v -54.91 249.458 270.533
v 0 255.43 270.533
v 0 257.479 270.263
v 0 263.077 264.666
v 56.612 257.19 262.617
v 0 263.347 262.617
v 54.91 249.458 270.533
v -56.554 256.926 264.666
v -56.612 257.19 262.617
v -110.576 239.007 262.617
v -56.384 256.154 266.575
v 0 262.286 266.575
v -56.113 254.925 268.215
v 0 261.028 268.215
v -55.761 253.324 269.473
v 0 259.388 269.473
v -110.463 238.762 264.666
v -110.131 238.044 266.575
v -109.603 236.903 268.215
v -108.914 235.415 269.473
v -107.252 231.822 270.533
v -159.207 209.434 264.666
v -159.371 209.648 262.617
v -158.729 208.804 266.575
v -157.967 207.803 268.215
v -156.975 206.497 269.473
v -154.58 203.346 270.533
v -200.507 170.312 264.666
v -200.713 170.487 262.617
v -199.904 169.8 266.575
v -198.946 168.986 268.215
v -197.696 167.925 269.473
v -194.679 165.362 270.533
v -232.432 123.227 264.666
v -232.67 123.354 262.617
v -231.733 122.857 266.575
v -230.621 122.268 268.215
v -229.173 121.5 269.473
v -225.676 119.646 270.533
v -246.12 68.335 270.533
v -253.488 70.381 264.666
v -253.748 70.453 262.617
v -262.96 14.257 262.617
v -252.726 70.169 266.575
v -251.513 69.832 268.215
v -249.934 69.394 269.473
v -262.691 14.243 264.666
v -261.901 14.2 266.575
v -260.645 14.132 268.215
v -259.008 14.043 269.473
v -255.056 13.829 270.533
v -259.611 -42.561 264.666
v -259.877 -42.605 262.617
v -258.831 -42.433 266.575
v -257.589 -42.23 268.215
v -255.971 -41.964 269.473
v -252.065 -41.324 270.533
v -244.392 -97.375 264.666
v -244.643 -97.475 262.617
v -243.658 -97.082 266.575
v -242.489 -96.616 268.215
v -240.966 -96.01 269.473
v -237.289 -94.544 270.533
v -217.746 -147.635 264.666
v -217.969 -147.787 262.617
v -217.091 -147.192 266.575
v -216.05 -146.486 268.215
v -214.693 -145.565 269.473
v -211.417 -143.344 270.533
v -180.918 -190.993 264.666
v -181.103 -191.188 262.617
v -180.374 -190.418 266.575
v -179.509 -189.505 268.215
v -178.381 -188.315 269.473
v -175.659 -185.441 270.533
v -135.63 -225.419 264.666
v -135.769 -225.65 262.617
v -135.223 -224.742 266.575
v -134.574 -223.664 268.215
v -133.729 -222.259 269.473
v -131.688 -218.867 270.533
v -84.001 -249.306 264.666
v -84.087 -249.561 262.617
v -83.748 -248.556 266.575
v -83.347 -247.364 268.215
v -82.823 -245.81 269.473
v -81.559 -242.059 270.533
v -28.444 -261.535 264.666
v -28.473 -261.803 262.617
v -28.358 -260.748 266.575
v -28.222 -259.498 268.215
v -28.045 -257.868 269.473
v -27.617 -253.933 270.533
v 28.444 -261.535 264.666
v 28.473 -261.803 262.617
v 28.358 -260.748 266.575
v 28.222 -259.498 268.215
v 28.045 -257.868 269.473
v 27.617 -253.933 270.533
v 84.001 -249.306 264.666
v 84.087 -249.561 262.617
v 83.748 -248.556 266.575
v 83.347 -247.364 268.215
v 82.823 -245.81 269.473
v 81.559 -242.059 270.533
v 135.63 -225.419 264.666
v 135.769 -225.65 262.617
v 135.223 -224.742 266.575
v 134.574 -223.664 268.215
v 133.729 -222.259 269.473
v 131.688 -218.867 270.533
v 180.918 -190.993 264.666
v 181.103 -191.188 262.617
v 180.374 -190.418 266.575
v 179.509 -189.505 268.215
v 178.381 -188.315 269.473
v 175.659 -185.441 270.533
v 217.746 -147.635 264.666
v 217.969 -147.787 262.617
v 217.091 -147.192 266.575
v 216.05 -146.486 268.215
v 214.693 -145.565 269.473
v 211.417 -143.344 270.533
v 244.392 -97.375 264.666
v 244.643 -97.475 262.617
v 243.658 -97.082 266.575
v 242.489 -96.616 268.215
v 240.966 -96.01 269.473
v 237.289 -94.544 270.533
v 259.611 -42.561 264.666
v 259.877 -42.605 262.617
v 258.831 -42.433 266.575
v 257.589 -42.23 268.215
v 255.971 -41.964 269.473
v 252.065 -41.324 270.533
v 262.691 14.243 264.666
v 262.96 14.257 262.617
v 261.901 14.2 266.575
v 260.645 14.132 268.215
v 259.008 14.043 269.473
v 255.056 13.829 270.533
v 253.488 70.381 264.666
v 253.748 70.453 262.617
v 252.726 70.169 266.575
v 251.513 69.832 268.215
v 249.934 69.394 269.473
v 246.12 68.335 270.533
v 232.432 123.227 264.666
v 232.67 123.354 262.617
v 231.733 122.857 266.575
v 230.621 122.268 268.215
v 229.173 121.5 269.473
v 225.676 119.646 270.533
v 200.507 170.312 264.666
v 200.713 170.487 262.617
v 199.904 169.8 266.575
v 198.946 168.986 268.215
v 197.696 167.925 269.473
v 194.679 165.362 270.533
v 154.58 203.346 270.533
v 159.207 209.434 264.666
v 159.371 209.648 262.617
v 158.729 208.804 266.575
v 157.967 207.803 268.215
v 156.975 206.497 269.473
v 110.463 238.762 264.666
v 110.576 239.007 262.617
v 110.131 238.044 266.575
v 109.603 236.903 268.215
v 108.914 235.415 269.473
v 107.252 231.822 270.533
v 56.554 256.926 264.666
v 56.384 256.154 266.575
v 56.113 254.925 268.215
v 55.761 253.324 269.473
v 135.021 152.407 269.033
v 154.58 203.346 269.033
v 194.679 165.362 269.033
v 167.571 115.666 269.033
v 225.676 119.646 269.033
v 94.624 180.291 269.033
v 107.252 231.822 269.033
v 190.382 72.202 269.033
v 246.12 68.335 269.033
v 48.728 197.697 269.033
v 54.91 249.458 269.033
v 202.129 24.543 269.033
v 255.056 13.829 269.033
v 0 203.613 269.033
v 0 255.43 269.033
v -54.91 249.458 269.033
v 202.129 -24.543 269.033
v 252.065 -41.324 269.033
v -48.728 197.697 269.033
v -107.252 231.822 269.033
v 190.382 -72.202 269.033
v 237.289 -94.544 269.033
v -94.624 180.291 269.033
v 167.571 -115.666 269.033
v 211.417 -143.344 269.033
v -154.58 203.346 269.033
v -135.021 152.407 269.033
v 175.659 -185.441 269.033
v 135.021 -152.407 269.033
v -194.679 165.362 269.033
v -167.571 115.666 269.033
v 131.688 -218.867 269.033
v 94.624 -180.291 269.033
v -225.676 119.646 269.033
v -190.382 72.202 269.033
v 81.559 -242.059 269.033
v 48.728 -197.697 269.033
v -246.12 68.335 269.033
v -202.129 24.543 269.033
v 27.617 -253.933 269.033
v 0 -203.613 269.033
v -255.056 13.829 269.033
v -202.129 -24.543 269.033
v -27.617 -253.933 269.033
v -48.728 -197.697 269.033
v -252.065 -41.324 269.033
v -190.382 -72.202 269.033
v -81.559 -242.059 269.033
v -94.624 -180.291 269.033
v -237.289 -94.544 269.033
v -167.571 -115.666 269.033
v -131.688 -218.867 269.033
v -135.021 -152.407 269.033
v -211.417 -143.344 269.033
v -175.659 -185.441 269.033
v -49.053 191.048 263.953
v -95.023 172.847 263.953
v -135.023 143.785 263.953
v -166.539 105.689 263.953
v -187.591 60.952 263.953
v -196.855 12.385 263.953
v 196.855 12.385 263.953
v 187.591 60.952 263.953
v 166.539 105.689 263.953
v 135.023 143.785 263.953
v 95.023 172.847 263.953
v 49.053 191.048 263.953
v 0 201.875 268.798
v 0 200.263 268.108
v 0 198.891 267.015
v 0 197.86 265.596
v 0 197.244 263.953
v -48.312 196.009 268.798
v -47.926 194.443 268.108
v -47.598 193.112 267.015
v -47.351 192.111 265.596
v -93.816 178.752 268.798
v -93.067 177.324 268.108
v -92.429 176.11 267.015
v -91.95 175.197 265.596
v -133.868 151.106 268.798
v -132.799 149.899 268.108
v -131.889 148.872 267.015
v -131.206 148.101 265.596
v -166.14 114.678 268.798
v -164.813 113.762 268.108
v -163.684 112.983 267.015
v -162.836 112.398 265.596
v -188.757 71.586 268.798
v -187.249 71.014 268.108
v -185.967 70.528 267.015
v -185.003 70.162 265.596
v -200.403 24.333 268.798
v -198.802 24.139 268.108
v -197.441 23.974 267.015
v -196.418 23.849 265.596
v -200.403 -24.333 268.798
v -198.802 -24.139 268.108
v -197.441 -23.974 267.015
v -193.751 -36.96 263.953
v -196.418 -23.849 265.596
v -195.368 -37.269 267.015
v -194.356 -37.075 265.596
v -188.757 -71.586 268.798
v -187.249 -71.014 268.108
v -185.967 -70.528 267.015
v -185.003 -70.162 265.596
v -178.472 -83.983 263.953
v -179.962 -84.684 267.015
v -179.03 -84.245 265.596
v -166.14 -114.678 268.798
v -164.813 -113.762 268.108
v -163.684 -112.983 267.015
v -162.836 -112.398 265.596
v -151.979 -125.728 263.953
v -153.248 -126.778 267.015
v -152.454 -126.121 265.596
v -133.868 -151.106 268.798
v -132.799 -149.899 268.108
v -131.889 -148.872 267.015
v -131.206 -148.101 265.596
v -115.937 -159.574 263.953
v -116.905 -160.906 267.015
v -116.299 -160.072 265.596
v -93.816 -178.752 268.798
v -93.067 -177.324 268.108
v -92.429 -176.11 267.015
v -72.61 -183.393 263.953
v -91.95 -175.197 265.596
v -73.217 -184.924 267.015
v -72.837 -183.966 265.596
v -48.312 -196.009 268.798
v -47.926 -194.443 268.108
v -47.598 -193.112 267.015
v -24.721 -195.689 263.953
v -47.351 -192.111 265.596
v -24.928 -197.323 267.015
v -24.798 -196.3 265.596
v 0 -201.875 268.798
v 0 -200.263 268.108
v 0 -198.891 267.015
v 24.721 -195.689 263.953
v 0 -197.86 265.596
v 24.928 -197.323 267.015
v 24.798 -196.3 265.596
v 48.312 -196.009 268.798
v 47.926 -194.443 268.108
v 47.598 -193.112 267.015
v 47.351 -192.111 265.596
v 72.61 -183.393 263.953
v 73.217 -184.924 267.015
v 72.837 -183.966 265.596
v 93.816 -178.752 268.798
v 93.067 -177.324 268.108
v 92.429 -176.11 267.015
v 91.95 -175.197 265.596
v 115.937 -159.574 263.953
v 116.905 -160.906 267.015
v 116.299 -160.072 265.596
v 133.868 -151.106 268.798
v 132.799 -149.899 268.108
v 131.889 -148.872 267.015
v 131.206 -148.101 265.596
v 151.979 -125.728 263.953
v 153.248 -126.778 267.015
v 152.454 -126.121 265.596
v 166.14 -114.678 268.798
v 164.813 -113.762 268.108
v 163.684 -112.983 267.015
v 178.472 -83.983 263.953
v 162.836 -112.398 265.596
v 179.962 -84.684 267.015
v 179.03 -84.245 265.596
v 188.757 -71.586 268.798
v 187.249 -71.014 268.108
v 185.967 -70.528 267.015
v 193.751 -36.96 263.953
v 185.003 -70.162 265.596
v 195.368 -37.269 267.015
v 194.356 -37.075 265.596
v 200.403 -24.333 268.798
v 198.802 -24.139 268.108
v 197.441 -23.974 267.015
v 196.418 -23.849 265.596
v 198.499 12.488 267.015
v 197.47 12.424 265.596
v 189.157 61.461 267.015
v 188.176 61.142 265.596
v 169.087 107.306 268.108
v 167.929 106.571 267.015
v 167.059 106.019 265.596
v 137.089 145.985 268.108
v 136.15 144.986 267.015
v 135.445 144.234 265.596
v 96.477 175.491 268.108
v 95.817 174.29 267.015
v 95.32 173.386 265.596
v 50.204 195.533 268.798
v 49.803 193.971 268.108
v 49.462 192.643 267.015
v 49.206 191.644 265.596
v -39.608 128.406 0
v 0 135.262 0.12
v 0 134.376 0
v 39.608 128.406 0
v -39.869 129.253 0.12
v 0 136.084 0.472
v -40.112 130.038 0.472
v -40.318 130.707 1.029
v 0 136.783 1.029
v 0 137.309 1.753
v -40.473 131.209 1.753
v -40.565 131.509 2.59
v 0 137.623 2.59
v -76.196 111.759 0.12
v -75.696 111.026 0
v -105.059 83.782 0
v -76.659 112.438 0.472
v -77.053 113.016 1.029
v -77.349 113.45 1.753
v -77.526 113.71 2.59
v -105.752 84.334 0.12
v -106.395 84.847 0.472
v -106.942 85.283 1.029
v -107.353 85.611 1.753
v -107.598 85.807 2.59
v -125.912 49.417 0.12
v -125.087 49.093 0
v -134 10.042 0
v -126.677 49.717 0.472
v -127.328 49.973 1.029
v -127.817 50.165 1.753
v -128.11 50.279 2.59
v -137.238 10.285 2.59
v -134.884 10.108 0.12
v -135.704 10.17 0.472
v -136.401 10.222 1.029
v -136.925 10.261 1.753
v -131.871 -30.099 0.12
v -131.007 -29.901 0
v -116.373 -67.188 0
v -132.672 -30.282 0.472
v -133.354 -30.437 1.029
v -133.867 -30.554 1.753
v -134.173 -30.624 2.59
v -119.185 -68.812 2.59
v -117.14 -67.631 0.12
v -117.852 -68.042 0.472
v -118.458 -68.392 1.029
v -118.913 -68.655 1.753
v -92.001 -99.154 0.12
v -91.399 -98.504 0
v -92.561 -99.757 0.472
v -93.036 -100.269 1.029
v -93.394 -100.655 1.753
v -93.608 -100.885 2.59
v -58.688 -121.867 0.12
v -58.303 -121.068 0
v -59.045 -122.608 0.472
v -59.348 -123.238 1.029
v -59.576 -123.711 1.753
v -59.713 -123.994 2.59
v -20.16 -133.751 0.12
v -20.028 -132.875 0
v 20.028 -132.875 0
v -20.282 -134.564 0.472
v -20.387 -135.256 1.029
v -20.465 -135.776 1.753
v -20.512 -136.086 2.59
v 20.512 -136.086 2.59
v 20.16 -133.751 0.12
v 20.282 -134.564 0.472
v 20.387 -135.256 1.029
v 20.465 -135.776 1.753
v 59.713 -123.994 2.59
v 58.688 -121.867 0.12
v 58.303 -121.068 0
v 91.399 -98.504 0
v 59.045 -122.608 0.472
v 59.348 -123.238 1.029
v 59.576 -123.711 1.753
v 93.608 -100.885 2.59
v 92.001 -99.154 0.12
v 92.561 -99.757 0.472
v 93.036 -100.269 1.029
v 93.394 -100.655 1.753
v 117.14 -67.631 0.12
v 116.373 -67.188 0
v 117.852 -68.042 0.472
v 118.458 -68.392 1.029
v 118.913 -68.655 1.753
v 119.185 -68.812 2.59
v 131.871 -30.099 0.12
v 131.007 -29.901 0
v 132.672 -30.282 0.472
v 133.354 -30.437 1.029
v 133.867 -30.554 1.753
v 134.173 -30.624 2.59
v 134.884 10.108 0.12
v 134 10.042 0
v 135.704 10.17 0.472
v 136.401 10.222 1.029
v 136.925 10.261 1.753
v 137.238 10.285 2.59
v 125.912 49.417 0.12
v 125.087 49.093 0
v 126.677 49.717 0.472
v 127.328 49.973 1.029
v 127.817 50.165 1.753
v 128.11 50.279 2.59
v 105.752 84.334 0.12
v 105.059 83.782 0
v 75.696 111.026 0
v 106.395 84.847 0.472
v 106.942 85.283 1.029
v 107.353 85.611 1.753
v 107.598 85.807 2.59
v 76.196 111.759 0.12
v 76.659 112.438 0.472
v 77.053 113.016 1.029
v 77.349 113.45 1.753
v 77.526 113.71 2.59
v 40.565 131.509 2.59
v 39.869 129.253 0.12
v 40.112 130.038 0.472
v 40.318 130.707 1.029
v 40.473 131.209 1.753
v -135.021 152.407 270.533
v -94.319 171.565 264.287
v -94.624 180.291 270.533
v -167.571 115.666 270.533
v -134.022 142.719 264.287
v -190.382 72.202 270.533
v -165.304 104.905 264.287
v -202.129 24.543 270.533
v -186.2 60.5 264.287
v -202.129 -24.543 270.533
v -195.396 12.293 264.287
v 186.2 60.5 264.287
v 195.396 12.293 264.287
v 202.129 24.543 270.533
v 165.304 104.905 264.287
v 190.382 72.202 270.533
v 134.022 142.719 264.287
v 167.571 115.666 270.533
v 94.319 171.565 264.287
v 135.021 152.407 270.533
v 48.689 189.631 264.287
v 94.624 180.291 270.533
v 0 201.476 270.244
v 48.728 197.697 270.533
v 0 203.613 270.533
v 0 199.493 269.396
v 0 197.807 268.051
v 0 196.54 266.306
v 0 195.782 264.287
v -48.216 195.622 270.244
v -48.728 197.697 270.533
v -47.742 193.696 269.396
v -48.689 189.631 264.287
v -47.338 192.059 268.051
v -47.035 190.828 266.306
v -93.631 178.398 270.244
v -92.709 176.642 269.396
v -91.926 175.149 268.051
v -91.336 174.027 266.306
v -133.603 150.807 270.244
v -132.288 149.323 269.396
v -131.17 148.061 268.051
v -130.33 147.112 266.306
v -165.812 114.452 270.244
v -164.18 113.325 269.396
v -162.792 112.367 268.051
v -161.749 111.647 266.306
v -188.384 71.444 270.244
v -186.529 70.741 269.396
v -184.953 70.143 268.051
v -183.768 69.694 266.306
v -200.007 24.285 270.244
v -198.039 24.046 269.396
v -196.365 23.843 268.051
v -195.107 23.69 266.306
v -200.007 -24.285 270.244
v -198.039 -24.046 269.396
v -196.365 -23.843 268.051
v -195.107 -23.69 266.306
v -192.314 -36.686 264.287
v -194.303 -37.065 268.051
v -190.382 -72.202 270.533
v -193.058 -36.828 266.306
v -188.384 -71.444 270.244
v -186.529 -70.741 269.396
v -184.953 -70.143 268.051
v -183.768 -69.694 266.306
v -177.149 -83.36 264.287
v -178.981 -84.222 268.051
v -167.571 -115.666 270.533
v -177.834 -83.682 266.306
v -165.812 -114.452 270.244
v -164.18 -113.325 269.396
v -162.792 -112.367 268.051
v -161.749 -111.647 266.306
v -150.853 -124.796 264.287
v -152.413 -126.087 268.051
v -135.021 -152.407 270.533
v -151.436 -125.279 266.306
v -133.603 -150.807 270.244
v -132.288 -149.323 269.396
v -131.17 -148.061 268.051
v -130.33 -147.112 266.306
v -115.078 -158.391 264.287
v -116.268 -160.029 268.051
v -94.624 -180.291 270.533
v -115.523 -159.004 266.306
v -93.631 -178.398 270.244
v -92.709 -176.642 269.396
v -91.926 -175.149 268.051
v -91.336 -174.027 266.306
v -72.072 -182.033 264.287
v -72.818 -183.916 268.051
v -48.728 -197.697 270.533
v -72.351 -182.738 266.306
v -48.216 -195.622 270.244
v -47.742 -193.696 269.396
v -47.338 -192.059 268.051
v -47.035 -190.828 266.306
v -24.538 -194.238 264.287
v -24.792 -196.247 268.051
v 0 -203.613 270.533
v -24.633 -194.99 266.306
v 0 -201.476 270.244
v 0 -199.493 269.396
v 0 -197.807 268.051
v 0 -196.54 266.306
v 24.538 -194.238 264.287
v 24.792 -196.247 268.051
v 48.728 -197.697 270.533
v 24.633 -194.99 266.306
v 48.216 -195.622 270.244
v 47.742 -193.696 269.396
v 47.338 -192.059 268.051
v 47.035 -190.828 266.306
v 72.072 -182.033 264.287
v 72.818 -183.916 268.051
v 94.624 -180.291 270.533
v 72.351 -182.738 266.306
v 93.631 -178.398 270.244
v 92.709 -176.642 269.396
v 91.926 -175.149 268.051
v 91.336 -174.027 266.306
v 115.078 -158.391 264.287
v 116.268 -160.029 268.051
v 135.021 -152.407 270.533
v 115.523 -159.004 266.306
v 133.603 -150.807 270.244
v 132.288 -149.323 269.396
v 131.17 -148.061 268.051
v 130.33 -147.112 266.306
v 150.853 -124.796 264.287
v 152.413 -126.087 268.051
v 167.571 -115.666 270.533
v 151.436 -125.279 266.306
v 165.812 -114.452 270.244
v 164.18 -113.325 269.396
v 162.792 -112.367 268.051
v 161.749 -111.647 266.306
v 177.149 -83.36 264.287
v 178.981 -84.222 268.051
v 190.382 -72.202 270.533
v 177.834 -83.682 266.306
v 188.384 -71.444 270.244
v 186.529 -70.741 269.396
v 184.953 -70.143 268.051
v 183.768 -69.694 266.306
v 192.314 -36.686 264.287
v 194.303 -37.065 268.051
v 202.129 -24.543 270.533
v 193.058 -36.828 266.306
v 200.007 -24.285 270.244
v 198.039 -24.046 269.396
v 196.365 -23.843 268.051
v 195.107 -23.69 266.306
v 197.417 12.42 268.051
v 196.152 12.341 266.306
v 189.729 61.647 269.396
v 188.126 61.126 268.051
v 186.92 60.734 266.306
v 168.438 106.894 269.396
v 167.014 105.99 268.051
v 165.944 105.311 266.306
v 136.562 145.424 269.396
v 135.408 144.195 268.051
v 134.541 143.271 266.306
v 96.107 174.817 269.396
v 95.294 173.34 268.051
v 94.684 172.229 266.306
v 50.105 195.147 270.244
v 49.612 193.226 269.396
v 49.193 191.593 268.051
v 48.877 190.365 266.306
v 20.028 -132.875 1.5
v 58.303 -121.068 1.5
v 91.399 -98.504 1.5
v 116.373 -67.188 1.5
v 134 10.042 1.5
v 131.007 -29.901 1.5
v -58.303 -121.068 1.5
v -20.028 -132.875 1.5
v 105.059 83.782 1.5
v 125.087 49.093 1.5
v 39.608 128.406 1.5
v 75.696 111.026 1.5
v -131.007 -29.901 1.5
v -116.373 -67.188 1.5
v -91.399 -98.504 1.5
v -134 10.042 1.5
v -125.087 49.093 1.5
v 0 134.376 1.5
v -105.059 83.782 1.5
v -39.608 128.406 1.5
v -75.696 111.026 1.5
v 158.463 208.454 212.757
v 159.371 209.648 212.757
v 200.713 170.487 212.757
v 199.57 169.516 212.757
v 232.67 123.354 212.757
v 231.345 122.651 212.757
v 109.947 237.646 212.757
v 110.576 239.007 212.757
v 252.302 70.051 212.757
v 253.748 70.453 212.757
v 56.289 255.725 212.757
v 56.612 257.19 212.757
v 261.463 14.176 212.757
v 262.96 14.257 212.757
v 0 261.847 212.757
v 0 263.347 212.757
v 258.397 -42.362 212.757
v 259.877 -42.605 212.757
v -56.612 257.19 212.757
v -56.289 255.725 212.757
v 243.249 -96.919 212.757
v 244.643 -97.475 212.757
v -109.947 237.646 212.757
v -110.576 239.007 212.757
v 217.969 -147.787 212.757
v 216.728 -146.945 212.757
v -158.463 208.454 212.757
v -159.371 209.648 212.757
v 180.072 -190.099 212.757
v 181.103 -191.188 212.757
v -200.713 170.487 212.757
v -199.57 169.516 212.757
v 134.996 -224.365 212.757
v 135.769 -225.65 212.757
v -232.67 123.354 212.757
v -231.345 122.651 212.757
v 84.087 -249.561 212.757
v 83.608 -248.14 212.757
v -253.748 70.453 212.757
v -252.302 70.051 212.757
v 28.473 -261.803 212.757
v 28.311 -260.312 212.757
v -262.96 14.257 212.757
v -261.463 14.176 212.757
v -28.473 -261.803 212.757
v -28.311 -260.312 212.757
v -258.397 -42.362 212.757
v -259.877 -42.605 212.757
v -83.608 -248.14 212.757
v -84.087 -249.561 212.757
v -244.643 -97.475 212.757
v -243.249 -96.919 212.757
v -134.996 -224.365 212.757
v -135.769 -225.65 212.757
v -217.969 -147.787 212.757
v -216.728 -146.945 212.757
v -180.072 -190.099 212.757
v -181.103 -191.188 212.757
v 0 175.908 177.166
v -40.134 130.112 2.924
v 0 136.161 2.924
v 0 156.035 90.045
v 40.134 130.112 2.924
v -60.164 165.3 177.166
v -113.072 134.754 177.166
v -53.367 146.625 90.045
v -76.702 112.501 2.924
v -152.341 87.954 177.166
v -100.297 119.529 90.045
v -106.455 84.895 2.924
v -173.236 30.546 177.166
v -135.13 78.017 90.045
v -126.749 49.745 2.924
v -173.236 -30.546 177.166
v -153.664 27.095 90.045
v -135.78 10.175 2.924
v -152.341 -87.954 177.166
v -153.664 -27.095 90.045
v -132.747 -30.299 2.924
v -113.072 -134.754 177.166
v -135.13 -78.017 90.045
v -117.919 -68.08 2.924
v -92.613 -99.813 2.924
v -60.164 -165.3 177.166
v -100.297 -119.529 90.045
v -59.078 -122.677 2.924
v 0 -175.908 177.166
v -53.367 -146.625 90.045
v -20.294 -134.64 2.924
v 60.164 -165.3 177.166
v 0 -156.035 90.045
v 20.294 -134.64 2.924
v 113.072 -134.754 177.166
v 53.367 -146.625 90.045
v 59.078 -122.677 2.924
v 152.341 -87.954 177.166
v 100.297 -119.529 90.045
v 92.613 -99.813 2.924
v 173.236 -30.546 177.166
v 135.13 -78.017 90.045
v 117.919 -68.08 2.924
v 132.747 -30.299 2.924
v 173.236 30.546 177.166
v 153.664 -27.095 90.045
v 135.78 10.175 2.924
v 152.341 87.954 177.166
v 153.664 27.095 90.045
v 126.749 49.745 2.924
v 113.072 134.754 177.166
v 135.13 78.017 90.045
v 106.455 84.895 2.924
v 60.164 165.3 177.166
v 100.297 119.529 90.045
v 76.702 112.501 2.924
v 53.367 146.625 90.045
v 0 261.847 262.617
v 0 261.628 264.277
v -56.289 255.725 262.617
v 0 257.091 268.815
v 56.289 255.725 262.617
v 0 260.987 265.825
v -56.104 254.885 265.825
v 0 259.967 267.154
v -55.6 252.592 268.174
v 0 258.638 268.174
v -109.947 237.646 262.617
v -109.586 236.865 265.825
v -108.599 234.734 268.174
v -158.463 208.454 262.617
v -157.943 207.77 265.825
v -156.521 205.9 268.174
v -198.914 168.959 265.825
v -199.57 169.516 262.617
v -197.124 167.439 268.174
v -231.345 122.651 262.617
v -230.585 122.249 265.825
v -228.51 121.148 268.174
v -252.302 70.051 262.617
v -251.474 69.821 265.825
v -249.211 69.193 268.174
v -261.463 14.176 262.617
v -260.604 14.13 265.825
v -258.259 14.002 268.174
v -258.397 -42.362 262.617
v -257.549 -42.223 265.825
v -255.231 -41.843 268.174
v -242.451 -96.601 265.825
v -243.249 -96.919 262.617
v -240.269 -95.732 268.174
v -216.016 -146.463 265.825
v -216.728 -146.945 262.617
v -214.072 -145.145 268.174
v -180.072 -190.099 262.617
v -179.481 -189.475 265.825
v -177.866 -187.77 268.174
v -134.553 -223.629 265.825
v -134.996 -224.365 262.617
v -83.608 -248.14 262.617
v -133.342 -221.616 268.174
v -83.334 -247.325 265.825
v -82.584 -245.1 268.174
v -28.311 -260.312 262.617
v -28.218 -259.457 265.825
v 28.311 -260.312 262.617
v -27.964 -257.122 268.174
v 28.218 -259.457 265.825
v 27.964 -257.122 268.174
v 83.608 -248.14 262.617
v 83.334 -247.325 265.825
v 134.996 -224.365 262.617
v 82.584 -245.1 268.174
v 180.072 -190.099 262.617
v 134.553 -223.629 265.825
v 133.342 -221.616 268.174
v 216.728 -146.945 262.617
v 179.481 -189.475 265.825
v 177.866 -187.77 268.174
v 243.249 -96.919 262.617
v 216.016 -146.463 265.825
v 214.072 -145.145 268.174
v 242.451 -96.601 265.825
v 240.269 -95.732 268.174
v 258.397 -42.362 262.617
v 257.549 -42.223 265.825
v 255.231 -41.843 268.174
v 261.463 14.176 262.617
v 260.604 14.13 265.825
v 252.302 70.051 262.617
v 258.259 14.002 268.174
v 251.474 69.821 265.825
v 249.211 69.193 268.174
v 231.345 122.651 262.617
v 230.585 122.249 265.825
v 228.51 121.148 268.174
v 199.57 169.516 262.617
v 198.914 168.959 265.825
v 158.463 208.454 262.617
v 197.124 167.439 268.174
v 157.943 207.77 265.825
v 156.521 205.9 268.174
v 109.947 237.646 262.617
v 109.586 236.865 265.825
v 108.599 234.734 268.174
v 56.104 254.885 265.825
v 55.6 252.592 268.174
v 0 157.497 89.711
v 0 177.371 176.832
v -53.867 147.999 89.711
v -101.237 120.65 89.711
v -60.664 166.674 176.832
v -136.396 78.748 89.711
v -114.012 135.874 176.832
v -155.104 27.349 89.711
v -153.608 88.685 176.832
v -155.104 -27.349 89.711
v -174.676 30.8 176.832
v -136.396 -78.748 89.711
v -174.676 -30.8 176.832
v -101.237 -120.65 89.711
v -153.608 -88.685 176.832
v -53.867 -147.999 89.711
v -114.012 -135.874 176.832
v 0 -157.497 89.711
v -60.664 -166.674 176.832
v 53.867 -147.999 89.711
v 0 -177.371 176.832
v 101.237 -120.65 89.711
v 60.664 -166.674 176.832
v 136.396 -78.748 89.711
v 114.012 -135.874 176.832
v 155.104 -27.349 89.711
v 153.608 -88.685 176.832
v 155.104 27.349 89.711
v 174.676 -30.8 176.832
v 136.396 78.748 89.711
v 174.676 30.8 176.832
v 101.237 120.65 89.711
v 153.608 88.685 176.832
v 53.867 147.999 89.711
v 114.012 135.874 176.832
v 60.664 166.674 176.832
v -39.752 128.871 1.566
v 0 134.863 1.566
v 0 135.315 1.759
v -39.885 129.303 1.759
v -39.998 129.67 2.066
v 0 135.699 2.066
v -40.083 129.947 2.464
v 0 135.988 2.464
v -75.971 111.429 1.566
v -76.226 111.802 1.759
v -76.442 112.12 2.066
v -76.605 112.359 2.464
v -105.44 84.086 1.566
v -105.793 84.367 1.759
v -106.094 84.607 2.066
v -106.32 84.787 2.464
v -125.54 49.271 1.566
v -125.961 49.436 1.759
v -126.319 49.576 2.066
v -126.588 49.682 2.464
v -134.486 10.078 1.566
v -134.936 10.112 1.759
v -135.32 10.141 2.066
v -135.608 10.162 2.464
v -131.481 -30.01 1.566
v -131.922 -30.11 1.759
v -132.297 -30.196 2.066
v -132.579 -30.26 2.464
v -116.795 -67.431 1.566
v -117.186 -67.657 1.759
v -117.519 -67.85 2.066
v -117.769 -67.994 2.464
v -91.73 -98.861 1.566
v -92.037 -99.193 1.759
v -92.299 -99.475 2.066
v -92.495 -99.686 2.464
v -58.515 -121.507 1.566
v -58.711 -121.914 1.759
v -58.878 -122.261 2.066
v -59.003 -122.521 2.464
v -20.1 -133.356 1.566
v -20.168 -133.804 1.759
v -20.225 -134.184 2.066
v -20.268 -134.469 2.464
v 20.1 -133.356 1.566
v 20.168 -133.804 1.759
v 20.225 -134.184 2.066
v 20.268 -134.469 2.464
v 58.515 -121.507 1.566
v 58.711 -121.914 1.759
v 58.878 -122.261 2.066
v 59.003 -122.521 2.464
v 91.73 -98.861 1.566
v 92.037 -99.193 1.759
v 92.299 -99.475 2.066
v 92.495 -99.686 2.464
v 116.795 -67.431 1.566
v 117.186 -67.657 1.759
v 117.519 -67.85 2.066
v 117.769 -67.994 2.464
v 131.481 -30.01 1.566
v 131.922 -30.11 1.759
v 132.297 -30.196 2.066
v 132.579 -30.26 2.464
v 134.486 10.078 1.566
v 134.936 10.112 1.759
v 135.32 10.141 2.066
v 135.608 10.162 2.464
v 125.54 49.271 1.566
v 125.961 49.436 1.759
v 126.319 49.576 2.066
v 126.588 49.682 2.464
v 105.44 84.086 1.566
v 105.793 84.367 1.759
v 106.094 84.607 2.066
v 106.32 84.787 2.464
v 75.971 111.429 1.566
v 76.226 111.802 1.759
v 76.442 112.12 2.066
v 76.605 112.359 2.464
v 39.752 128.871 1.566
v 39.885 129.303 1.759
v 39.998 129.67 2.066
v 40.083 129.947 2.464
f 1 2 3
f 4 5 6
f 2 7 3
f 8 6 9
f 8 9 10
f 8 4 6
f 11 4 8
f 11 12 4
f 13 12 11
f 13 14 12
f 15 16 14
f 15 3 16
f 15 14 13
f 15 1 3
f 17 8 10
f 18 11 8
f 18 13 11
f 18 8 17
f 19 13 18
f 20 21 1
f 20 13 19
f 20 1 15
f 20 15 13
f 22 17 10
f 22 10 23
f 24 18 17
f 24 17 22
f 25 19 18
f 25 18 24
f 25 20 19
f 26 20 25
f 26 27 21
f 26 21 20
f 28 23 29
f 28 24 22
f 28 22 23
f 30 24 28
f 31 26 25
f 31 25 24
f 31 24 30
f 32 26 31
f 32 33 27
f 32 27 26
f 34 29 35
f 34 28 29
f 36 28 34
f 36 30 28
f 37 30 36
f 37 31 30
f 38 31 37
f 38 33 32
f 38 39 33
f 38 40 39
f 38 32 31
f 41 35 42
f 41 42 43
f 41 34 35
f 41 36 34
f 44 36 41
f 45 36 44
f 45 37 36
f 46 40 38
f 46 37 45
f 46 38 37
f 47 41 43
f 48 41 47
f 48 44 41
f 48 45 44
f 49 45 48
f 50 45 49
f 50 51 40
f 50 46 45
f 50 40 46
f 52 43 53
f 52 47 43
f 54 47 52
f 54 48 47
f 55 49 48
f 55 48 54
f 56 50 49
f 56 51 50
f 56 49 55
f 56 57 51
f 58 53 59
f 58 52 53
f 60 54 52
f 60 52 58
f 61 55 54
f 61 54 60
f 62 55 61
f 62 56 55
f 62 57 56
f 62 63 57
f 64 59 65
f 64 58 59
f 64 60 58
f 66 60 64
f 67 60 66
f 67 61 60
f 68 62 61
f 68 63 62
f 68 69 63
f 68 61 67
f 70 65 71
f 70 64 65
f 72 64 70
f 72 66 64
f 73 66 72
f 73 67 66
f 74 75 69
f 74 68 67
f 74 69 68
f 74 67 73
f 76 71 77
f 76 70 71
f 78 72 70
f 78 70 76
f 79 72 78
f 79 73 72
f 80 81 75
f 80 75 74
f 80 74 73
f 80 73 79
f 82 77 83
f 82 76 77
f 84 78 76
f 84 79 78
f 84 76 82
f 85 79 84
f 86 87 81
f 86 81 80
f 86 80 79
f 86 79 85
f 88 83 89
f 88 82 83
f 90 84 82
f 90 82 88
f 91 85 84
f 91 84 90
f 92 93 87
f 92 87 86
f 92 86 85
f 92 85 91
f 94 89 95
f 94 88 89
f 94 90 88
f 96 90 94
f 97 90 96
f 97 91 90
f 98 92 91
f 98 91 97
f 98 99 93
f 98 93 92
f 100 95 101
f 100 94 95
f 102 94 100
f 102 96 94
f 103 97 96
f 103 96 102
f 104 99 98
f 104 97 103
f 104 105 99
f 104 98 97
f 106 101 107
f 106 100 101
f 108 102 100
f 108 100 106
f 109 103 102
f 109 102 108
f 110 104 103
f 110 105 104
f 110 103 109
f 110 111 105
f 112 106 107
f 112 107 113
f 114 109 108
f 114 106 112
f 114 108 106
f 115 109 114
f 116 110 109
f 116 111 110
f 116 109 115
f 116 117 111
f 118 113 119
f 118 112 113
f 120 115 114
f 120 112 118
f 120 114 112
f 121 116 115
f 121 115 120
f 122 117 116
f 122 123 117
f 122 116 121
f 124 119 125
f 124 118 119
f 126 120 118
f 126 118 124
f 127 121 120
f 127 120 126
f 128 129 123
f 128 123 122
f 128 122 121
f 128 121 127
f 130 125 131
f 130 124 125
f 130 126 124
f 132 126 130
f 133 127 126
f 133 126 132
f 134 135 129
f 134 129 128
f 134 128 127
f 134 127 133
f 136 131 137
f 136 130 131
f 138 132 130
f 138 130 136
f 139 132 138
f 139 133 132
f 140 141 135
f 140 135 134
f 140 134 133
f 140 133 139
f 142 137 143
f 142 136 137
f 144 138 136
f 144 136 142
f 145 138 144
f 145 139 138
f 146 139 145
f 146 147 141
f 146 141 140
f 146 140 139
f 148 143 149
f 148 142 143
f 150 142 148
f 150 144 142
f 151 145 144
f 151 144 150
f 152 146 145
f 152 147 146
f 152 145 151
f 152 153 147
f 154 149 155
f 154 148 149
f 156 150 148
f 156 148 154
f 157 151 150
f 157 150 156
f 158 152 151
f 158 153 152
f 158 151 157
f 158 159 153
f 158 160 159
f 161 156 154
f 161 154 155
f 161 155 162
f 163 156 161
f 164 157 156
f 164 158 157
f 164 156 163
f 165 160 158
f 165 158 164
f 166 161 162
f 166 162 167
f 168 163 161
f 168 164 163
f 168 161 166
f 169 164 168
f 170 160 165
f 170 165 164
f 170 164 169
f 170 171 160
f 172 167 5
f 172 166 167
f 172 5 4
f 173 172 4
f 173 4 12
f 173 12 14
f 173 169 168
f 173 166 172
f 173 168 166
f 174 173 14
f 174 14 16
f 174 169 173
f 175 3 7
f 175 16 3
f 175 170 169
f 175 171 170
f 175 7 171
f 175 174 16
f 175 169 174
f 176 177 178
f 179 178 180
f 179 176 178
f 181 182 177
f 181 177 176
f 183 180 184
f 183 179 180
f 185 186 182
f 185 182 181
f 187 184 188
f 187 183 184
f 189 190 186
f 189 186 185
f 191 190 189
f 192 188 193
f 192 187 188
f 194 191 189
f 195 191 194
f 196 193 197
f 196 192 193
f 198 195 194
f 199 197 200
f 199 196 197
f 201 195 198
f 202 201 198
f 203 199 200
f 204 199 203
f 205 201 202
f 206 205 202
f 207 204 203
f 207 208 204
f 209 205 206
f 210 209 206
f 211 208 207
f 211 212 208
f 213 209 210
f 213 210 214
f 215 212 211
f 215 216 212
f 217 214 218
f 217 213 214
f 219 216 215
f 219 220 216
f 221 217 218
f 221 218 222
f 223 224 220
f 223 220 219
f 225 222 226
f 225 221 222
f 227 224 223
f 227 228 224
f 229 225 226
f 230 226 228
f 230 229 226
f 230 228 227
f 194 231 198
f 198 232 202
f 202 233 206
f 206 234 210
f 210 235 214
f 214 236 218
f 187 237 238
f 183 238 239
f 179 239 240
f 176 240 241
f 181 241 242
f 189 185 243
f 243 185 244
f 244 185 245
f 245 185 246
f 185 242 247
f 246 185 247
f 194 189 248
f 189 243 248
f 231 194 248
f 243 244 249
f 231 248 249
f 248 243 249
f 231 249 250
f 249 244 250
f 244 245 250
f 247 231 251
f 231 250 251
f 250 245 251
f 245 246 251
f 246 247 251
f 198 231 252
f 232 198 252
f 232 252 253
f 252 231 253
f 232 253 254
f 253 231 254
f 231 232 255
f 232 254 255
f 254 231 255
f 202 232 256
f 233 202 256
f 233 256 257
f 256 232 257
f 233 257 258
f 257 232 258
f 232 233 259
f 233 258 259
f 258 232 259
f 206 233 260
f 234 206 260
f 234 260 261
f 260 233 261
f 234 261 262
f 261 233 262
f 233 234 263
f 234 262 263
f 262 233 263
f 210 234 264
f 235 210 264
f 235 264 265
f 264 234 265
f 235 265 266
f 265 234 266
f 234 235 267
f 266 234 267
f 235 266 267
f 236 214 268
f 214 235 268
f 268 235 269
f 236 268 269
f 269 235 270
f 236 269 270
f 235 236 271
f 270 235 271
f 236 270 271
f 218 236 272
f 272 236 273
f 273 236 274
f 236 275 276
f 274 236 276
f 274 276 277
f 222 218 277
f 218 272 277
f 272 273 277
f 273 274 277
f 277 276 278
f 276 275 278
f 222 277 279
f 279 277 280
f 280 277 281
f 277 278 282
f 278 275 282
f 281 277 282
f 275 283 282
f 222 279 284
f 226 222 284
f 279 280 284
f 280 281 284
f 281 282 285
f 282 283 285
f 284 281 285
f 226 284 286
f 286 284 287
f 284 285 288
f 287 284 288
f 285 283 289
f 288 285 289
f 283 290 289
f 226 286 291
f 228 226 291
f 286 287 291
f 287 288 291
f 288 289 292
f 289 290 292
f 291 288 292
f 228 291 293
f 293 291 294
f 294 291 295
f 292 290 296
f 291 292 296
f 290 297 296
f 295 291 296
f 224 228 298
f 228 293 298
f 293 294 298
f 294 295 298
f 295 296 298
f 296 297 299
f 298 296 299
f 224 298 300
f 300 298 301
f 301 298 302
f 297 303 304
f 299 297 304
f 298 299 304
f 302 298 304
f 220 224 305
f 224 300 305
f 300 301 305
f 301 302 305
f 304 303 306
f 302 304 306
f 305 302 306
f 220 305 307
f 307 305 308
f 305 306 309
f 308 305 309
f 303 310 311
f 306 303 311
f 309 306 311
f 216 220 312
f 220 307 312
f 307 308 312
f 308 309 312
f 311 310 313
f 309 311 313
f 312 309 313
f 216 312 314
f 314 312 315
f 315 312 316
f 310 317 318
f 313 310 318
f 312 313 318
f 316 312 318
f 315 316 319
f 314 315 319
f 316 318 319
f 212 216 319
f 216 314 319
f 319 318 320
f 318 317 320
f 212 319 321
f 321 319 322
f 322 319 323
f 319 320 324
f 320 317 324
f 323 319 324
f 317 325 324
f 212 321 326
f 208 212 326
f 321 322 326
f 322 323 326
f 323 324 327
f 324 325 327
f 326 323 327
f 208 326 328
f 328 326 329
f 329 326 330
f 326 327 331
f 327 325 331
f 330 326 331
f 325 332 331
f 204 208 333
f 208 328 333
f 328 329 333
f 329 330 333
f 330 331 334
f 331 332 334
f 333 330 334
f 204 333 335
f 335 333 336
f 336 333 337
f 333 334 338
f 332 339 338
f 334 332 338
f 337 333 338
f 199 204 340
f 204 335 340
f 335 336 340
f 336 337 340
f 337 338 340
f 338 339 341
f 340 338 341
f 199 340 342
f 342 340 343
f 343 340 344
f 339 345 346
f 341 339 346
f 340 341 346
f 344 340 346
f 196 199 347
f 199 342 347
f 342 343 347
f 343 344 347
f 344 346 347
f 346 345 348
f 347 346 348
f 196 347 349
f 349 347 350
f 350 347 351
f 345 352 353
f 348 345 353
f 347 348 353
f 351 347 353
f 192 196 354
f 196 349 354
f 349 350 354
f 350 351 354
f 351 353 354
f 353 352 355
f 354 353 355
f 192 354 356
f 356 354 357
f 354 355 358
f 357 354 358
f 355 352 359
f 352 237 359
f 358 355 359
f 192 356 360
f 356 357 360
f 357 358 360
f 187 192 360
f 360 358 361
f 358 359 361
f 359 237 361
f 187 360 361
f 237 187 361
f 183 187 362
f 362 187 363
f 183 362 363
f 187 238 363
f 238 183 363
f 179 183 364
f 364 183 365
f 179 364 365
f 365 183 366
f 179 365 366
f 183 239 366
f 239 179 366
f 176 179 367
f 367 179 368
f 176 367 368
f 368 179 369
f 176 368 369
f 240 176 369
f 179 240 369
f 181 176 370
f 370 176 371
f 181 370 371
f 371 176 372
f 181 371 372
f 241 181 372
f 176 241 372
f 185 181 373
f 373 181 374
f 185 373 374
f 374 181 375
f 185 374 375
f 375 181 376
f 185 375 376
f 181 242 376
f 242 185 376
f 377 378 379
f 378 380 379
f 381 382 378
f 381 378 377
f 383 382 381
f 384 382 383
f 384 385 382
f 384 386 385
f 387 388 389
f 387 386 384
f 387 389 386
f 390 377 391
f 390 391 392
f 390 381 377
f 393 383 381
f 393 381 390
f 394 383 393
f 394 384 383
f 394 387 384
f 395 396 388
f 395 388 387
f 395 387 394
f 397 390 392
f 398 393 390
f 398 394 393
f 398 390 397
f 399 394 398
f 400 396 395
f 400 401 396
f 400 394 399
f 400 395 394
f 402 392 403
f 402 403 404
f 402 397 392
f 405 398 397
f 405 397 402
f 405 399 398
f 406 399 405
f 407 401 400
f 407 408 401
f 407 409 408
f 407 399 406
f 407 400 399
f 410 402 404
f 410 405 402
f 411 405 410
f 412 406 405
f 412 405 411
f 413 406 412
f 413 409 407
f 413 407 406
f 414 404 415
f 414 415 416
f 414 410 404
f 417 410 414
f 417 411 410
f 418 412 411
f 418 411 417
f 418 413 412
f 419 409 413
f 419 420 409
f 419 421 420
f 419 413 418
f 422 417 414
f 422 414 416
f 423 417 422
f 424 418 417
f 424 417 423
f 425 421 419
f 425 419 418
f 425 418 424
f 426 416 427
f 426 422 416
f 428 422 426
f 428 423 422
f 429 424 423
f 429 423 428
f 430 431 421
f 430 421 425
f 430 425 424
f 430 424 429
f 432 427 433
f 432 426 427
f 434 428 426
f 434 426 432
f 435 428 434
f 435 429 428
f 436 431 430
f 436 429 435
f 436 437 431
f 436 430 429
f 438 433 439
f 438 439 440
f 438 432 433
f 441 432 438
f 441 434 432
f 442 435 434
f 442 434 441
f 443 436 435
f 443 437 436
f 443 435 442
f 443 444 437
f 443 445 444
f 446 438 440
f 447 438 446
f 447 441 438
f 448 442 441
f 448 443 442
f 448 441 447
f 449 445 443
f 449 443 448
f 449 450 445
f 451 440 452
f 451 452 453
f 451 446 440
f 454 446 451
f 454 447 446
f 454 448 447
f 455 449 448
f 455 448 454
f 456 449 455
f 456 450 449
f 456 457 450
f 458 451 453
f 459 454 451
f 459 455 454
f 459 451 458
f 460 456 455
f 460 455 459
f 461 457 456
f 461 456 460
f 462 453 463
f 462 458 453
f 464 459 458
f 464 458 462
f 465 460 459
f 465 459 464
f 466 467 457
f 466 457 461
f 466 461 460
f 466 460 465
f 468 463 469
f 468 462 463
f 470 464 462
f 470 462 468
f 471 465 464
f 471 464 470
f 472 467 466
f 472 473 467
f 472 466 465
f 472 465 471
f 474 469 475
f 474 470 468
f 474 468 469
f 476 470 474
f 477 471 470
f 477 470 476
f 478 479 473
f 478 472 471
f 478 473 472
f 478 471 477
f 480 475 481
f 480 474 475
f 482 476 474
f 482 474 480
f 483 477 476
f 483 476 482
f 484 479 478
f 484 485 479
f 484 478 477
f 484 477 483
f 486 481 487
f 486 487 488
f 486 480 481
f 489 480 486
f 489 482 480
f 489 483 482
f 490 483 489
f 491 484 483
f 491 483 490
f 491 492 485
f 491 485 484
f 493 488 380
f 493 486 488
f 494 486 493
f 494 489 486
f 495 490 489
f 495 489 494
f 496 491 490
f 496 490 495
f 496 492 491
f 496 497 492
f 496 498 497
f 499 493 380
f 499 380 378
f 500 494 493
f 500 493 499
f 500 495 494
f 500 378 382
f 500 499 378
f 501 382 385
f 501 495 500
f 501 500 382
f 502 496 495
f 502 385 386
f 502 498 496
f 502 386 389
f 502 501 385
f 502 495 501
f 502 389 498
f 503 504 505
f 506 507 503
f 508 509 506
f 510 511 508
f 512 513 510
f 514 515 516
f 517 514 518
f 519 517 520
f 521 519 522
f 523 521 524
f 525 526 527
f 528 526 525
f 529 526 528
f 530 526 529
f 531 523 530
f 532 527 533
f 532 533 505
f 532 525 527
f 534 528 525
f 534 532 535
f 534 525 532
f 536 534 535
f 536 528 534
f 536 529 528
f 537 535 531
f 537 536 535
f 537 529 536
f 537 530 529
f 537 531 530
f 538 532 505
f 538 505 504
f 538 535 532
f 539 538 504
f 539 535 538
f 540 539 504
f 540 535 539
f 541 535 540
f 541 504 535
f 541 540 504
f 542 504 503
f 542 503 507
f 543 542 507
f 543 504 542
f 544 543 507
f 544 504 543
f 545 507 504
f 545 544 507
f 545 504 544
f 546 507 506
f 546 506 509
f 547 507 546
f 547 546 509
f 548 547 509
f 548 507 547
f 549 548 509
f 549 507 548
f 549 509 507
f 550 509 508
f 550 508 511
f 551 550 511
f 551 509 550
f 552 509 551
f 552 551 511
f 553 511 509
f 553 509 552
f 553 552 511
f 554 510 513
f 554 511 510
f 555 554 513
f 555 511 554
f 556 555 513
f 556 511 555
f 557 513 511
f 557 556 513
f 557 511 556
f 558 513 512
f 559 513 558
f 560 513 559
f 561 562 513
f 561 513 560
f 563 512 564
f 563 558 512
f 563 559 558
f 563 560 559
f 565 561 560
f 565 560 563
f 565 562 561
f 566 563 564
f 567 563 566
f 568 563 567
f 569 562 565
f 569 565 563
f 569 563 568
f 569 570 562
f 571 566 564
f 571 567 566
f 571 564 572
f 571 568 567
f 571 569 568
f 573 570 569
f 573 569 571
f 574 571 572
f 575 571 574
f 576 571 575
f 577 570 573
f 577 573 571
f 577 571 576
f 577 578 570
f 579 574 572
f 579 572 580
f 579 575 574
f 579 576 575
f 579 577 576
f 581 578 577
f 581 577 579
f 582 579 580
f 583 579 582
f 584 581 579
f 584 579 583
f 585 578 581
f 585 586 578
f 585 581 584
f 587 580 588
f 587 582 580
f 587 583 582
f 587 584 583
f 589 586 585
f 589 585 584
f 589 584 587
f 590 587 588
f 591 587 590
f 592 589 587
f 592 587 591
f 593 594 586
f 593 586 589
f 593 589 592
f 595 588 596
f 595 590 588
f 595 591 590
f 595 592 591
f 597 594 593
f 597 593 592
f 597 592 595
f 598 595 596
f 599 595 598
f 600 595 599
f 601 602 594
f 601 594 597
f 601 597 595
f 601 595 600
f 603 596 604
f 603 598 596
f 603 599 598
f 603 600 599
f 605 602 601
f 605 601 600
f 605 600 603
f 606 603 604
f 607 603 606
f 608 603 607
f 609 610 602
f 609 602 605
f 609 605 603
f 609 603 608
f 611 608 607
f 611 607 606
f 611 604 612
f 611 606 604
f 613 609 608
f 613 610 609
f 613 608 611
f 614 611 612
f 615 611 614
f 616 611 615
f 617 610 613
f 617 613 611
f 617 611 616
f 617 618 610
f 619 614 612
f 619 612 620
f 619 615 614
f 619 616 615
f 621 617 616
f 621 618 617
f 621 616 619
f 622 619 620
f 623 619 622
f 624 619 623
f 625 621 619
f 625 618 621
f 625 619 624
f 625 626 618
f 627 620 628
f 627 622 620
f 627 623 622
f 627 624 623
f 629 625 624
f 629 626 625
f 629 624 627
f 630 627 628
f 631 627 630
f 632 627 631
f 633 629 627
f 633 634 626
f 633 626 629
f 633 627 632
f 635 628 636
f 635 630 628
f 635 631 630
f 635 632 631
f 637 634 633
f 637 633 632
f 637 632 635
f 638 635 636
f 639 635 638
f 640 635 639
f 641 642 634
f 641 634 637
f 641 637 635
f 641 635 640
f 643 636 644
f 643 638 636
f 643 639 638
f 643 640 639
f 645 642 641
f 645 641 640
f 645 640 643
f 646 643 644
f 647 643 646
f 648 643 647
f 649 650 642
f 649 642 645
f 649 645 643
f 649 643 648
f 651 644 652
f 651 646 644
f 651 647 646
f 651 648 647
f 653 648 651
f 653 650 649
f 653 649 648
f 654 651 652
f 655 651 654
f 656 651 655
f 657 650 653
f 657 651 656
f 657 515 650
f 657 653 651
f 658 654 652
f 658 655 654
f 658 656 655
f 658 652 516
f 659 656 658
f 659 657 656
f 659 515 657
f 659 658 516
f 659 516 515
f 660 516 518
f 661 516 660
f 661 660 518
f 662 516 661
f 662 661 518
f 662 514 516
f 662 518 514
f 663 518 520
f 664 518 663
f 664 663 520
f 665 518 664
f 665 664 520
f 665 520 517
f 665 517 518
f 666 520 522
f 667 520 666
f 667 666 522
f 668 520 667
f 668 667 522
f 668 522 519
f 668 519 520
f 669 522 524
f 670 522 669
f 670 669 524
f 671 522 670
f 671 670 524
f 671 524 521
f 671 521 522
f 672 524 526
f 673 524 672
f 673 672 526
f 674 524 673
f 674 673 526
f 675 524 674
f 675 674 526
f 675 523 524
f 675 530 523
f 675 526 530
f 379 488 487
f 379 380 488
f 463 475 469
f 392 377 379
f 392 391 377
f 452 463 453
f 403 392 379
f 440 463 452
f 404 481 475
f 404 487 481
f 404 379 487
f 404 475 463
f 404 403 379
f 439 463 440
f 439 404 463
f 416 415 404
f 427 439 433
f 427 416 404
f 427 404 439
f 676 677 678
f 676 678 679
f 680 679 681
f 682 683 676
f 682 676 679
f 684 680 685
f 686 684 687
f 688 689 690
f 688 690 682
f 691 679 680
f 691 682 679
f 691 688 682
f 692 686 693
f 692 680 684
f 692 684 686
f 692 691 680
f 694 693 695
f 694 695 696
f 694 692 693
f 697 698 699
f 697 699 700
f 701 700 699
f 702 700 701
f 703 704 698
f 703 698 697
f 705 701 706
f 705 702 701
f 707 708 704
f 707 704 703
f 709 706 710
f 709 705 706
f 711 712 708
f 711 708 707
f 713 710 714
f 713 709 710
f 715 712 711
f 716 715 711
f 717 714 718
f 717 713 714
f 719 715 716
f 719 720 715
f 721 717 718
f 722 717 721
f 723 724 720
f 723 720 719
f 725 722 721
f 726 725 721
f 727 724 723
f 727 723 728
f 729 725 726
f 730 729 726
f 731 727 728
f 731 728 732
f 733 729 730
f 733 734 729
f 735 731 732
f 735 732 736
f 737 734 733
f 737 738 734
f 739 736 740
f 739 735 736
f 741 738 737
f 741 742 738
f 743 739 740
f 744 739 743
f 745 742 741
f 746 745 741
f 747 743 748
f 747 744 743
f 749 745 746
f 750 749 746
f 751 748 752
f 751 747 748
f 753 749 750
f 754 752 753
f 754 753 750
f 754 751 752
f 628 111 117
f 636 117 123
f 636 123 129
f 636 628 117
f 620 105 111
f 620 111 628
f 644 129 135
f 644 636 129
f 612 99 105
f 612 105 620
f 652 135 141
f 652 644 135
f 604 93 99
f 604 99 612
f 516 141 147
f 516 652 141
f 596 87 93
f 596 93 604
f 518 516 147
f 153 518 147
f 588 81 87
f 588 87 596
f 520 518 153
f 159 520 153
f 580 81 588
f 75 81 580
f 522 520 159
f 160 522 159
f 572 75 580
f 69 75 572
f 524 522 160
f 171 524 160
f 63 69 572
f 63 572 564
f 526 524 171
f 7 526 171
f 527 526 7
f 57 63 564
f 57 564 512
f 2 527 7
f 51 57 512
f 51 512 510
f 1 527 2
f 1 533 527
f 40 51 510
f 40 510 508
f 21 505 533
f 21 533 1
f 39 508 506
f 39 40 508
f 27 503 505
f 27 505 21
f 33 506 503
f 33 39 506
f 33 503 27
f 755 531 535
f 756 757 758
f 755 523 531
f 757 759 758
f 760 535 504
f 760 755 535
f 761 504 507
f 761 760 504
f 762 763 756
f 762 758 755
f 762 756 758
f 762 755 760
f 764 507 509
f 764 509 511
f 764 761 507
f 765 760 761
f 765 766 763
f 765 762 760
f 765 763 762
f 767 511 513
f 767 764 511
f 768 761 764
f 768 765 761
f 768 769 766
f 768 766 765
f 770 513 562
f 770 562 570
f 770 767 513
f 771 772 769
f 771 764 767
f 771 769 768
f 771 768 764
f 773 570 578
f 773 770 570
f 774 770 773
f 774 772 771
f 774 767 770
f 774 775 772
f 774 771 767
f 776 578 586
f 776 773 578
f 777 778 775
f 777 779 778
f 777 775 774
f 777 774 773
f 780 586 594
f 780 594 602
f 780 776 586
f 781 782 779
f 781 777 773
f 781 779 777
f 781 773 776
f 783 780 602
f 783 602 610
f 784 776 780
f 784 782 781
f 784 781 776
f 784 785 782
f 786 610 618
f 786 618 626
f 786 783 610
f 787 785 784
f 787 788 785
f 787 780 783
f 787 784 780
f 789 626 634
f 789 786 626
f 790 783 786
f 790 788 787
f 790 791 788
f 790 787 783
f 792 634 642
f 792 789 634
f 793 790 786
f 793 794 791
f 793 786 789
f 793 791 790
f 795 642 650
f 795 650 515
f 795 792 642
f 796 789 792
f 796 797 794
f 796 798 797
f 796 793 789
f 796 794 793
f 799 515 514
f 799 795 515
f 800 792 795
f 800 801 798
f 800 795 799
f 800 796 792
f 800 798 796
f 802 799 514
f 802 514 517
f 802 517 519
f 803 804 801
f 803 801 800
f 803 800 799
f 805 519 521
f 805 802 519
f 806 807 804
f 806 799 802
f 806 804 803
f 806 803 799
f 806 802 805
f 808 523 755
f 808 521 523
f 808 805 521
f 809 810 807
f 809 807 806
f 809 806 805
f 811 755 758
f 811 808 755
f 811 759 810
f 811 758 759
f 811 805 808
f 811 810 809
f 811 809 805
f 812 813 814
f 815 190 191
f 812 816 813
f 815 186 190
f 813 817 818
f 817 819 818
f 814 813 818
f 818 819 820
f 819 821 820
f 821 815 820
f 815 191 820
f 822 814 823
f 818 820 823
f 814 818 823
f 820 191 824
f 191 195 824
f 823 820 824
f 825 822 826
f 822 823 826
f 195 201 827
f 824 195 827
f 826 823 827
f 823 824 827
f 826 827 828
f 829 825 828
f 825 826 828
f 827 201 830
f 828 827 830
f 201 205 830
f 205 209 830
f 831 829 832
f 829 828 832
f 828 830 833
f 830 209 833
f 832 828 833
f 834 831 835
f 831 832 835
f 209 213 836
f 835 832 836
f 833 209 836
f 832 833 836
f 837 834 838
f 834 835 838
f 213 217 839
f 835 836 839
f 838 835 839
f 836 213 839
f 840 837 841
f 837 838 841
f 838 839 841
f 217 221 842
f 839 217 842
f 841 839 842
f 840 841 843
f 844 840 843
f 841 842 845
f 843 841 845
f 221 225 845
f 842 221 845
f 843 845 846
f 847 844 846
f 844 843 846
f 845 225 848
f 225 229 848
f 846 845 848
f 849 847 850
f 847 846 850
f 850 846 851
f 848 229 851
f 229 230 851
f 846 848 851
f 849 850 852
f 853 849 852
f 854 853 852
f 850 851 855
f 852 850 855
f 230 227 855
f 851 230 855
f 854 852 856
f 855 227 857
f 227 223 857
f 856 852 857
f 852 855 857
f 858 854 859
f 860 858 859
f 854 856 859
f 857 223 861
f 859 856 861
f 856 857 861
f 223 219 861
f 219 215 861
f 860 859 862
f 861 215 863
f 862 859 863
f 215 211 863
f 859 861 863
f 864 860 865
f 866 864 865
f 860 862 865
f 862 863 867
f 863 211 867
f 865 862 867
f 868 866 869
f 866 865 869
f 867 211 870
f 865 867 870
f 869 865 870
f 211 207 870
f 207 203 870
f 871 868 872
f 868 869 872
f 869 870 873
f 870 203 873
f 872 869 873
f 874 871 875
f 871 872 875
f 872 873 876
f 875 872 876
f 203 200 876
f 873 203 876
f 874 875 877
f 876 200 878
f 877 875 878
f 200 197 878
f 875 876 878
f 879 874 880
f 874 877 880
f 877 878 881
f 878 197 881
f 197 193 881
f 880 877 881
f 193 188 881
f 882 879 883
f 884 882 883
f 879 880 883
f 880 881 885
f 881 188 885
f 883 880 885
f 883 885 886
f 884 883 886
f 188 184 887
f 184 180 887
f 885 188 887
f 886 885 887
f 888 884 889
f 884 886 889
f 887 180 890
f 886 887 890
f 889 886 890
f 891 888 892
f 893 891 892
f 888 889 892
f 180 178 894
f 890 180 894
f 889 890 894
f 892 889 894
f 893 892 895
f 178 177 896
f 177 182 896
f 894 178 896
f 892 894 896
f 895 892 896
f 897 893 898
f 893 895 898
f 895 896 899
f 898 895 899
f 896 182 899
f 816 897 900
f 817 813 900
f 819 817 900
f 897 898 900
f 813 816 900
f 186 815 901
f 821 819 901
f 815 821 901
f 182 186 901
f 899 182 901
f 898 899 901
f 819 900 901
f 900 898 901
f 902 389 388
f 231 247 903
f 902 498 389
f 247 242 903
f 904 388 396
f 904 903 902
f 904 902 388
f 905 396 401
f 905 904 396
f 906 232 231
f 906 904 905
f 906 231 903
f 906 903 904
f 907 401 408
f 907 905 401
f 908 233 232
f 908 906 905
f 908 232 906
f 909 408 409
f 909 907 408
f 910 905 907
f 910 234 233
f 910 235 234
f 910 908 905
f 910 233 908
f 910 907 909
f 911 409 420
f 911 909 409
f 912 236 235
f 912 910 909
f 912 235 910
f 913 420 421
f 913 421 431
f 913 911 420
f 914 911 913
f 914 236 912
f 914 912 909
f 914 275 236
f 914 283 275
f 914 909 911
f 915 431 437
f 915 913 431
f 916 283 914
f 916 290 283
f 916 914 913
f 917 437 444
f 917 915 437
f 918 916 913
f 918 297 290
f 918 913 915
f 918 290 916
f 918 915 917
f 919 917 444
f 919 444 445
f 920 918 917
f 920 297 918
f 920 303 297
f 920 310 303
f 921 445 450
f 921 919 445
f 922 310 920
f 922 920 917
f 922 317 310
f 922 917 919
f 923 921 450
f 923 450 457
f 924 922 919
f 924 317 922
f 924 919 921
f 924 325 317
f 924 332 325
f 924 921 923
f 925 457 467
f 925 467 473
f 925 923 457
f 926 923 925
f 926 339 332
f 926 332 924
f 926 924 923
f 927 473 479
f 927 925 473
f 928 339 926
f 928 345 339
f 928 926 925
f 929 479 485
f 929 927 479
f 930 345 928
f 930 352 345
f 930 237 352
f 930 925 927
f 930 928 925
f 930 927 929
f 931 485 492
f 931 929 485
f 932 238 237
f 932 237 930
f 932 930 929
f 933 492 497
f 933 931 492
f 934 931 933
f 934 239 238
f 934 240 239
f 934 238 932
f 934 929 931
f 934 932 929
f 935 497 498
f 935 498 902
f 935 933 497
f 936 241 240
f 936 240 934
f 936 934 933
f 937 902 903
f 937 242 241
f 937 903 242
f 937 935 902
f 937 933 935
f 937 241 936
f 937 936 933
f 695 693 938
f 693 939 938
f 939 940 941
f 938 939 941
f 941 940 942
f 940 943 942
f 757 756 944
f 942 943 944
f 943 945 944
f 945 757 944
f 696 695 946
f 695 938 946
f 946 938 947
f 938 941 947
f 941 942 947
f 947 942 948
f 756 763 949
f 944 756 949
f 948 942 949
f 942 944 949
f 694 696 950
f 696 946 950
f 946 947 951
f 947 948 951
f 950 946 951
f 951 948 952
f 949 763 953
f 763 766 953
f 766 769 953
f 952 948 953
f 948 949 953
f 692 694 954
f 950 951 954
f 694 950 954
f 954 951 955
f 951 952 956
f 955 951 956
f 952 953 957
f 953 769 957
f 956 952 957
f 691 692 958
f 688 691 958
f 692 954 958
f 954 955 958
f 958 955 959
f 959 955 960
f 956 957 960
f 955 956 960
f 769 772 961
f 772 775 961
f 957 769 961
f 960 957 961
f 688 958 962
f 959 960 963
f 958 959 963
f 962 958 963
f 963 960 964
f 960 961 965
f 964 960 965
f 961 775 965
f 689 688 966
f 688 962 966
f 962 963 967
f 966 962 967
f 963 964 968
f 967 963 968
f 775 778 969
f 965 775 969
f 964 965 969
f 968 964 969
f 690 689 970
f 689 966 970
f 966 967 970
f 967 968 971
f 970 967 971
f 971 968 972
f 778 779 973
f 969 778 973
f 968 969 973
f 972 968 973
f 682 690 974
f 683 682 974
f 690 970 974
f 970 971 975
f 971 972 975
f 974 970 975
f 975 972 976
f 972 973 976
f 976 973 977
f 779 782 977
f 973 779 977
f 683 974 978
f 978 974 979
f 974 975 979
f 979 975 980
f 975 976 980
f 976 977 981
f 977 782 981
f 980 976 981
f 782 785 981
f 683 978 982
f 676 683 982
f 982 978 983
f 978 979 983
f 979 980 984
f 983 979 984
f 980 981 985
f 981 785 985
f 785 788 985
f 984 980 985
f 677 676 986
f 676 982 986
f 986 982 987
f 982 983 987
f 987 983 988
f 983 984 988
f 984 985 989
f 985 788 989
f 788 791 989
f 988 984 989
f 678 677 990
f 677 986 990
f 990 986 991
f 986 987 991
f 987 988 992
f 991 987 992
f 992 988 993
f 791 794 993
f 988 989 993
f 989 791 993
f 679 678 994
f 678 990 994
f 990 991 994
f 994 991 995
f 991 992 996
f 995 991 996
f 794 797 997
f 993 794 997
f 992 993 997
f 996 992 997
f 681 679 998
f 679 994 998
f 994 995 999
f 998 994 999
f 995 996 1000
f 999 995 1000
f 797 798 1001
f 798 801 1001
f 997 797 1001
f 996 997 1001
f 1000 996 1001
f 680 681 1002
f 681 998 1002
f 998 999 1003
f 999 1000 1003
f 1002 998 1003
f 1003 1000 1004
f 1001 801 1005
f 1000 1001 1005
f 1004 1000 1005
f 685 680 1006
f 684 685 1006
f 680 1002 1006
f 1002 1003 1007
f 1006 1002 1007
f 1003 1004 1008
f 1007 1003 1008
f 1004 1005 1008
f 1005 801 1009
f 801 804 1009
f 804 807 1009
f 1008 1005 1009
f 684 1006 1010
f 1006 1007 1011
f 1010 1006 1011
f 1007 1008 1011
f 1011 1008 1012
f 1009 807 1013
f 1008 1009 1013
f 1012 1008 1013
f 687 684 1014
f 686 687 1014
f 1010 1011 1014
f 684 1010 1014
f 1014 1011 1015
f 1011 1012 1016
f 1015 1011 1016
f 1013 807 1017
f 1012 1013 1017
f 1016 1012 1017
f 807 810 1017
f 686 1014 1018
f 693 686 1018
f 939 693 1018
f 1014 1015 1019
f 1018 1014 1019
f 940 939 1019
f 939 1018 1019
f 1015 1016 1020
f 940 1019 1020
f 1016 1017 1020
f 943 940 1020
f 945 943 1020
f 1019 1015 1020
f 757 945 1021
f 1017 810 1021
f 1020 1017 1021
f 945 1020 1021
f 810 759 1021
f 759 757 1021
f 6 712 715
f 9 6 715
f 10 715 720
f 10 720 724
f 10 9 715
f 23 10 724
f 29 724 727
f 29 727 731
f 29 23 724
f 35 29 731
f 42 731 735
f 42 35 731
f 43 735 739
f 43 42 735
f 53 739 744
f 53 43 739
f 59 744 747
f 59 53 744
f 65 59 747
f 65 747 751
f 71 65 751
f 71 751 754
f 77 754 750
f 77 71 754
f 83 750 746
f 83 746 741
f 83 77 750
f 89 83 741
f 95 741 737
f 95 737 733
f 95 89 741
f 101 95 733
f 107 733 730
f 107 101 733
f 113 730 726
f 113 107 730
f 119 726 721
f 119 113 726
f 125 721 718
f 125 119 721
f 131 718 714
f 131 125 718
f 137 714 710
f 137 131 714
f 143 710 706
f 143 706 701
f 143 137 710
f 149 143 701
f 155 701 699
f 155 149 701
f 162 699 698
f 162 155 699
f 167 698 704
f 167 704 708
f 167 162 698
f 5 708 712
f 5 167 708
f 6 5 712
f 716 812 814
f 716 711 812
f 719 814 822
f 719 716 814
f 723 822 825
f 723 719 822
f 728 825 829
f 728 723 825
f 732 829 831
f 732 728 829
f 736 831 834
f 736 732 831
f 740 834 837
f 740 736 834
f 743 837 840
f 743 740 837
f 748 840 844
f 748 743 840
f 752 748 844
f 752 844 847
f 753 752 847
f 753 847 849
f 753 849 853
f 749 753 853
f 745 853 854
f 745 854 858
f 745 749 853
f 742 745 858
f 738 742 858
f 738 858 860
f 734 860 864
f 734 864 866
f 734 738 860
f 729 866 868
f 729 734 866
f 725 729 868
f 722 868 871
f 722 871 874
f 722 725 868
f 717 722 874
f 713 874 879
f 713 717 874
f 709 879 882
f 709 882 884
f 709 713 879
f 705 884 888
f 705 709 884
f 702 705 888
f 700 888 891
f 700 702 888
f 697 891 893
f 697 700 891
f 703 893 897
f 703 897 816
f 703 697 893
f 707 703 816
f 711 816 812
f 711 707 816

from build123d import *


with BuildPart() as part:
    # Sketch → Revolution (revolve)
    with BuildSketch(Plane.YZ):
        with BuildLine():
            Line((0, 0), (134.375587, 0))
            ThreePointArc((134.375587, 0), (136.452686, 0.726879), (137.623312, 2.590297))
            Line((137.623312, 2.590297), (197.24435, 263.953379))
            ThreePointArc((203.613453, 269.033202), (199.540062, 267.607722), (197.24435, 263.953379))
            Line((203.613453, 269.033202), (255.430231, 269.033202))
            ThreePointArc((261.846624, 262.616809), (259.967306, 267.153884), (255.430231, 269.033202))
            Line((261.846624, 262.616809), (261.846624, 212.756805))
            Line((261.846624, 212.756805), (263.346624, 212.756805))
            Line((263.346624, 212.756805), (263.346624, 262.616809))
            ThreePointArc((263.346624, 262.616809), (261.027966, 268.214544), (255.430231, 270.533202))
            Line((255.430231, 270.533202), (203.613453, 270.533202))
            ThreePointArc((203.613453, 270.533202), (198.604756, 268.780412), (195.781918, 264.286983))
            Line((195.781918, 264.286983), (136.16088, 2.923901))
            ThreePointArc((134.375587, 1.5), (135.51738, 1.89957), (136.16088, 2.923901))
            Line((134.375587, 1.5), (0, 1.5))
            Line((0, 1.5), (0, 0))
        make_face()
    revolve(axis=Axis((0, 0, 0), (0, 0, 1)))


solid = part.part
